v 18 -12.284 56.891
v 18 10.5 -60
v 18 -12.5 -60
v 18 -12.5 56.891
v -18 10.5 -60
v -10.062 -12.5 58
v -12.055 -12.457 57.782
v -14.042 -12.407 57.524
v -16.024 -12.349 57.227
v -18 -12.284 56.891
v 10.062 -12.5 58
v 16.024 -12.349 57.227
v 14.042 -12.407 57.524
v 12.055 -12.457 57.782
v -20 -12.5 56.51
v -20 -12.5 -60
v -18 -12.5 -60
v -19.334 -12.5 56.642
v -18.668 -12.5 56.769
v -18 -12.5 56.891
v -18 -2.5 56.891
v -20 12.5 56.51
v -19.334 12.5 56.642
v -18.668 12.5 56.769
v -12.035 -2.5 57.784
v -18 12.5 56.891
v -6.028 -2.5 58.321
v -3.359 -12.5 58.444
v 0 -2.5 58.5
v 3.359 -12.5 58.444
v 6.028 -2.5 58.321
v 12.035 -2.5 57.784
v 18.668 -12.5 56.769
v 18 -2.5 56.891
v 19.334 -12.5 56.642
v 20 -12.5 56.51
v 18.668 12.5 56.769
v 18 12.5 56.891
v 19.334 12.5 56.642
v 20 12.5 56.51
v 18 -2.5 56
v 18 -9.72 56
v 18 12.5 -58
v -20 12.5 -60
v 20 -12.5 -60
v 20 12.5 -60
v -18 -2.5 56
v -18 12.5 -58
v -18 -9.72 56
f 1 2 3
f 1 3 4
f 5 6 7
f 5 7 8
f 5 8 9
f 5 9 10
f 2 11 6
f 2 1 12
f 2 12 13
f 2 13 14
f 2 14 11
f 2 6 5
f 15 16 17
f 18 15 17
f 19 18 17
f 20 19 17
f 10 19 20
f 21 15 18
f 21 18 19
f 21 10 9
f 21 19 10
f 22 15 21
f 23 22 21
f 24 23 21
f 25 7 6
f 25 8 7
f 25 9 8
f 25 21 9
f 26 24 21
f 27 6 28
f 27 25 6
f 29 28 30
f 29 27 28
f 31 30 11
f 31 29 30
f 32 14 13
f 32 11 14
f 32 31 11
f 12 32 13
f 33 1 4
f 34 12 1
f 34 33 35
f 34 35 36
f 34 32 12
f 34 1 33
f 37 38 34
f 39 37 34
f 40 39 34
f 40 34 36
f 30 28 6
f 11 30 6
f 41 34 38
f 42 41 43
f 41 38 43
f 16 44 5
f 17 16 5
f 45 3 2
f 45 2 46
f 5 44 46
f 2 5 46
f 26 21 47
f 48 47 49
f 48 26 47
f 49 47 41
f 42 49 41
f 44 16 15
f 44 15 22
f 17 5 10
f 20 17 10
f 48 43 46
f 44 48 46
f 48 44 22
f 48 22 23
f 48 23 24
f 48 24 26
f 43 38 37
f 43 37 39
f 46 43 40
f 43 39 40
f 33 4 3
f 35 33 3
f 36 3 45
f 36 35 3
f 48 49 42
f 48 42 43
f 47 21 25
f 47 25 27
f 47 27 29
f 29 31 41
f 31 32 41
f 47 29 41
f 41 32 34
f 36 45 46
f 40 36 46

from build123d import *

# Parameters (mm, degrees)
SKETCH1_W           = 40
SKETCH1_H           = 25
BOSS_EXTRUDE1_DEPTH = 60
CUT_EXTRUDE3_DEPTH  = 18
SKETCH6_W           = 36
SKETCH6_H           = 8
BOSS_EXTRUDE2_DEPTH = 4
SKETCH7_R           = 500
SKETCH7_R_2         = 101.5
CUT_EXTRUDE4_DEPTH  = 26


with BuildPart() as part:
    # Sketch1 → Boss-Extrude1 (new body, symmetric)
    with BuildSketch(Plane.XY):
        Rectangle(SKETCH1_W, SKETCH1_H)
    extrude(amount=BOSS_EXTRUDE1_DEPTH, both=True)

    # Sketch4 → Cut-Extrude3 (cut, symmetric)
    with BuildSketch(Plane(origin=(0, 0, 0), x_dir=(0, 0, -1), z_dir=(1, 0, 0))):
        Polygon((-60, -10.5), (58, 12.5), (-60, 12.5), align=None)
        Polygon((-58, -12.5), (60, 10.5), (60, -12.5), align=None)
    extrude(amount=CUT_EXTRUDE3_DEPTH, both=True, mode=Mode.SUBTRACT)

    # Sketch6 → Boss-Extrude2 (add)
    with BuildSketch(Plane.XY.offset(60)):
        with Locations((0, -6.5)):
            Rectangle(SKETCH6_W, SKETCH6_H)
    extrude(amount=-BOSS_EXTRUDE2_DEPTH)

    # Sketch7 → Cut-Extrude4 (cut, through all)
    with BuildSketch(Plane(origin=(0, 12.5, 0), x_dir=(1, 0, 0), z_dir=(0, 1, 0))):
        with Locations((0, 43)):
            Circle(SKETCH7_R)
        with Locations((0, 43)):
            Circle(SKETCH7_R_2, mode=Mode.SUBTRACT)
    extrude(amount=-CUT_EXTRUDE4_DEPTH, mode=Mode.SUBTRACT)


solid = part.part
